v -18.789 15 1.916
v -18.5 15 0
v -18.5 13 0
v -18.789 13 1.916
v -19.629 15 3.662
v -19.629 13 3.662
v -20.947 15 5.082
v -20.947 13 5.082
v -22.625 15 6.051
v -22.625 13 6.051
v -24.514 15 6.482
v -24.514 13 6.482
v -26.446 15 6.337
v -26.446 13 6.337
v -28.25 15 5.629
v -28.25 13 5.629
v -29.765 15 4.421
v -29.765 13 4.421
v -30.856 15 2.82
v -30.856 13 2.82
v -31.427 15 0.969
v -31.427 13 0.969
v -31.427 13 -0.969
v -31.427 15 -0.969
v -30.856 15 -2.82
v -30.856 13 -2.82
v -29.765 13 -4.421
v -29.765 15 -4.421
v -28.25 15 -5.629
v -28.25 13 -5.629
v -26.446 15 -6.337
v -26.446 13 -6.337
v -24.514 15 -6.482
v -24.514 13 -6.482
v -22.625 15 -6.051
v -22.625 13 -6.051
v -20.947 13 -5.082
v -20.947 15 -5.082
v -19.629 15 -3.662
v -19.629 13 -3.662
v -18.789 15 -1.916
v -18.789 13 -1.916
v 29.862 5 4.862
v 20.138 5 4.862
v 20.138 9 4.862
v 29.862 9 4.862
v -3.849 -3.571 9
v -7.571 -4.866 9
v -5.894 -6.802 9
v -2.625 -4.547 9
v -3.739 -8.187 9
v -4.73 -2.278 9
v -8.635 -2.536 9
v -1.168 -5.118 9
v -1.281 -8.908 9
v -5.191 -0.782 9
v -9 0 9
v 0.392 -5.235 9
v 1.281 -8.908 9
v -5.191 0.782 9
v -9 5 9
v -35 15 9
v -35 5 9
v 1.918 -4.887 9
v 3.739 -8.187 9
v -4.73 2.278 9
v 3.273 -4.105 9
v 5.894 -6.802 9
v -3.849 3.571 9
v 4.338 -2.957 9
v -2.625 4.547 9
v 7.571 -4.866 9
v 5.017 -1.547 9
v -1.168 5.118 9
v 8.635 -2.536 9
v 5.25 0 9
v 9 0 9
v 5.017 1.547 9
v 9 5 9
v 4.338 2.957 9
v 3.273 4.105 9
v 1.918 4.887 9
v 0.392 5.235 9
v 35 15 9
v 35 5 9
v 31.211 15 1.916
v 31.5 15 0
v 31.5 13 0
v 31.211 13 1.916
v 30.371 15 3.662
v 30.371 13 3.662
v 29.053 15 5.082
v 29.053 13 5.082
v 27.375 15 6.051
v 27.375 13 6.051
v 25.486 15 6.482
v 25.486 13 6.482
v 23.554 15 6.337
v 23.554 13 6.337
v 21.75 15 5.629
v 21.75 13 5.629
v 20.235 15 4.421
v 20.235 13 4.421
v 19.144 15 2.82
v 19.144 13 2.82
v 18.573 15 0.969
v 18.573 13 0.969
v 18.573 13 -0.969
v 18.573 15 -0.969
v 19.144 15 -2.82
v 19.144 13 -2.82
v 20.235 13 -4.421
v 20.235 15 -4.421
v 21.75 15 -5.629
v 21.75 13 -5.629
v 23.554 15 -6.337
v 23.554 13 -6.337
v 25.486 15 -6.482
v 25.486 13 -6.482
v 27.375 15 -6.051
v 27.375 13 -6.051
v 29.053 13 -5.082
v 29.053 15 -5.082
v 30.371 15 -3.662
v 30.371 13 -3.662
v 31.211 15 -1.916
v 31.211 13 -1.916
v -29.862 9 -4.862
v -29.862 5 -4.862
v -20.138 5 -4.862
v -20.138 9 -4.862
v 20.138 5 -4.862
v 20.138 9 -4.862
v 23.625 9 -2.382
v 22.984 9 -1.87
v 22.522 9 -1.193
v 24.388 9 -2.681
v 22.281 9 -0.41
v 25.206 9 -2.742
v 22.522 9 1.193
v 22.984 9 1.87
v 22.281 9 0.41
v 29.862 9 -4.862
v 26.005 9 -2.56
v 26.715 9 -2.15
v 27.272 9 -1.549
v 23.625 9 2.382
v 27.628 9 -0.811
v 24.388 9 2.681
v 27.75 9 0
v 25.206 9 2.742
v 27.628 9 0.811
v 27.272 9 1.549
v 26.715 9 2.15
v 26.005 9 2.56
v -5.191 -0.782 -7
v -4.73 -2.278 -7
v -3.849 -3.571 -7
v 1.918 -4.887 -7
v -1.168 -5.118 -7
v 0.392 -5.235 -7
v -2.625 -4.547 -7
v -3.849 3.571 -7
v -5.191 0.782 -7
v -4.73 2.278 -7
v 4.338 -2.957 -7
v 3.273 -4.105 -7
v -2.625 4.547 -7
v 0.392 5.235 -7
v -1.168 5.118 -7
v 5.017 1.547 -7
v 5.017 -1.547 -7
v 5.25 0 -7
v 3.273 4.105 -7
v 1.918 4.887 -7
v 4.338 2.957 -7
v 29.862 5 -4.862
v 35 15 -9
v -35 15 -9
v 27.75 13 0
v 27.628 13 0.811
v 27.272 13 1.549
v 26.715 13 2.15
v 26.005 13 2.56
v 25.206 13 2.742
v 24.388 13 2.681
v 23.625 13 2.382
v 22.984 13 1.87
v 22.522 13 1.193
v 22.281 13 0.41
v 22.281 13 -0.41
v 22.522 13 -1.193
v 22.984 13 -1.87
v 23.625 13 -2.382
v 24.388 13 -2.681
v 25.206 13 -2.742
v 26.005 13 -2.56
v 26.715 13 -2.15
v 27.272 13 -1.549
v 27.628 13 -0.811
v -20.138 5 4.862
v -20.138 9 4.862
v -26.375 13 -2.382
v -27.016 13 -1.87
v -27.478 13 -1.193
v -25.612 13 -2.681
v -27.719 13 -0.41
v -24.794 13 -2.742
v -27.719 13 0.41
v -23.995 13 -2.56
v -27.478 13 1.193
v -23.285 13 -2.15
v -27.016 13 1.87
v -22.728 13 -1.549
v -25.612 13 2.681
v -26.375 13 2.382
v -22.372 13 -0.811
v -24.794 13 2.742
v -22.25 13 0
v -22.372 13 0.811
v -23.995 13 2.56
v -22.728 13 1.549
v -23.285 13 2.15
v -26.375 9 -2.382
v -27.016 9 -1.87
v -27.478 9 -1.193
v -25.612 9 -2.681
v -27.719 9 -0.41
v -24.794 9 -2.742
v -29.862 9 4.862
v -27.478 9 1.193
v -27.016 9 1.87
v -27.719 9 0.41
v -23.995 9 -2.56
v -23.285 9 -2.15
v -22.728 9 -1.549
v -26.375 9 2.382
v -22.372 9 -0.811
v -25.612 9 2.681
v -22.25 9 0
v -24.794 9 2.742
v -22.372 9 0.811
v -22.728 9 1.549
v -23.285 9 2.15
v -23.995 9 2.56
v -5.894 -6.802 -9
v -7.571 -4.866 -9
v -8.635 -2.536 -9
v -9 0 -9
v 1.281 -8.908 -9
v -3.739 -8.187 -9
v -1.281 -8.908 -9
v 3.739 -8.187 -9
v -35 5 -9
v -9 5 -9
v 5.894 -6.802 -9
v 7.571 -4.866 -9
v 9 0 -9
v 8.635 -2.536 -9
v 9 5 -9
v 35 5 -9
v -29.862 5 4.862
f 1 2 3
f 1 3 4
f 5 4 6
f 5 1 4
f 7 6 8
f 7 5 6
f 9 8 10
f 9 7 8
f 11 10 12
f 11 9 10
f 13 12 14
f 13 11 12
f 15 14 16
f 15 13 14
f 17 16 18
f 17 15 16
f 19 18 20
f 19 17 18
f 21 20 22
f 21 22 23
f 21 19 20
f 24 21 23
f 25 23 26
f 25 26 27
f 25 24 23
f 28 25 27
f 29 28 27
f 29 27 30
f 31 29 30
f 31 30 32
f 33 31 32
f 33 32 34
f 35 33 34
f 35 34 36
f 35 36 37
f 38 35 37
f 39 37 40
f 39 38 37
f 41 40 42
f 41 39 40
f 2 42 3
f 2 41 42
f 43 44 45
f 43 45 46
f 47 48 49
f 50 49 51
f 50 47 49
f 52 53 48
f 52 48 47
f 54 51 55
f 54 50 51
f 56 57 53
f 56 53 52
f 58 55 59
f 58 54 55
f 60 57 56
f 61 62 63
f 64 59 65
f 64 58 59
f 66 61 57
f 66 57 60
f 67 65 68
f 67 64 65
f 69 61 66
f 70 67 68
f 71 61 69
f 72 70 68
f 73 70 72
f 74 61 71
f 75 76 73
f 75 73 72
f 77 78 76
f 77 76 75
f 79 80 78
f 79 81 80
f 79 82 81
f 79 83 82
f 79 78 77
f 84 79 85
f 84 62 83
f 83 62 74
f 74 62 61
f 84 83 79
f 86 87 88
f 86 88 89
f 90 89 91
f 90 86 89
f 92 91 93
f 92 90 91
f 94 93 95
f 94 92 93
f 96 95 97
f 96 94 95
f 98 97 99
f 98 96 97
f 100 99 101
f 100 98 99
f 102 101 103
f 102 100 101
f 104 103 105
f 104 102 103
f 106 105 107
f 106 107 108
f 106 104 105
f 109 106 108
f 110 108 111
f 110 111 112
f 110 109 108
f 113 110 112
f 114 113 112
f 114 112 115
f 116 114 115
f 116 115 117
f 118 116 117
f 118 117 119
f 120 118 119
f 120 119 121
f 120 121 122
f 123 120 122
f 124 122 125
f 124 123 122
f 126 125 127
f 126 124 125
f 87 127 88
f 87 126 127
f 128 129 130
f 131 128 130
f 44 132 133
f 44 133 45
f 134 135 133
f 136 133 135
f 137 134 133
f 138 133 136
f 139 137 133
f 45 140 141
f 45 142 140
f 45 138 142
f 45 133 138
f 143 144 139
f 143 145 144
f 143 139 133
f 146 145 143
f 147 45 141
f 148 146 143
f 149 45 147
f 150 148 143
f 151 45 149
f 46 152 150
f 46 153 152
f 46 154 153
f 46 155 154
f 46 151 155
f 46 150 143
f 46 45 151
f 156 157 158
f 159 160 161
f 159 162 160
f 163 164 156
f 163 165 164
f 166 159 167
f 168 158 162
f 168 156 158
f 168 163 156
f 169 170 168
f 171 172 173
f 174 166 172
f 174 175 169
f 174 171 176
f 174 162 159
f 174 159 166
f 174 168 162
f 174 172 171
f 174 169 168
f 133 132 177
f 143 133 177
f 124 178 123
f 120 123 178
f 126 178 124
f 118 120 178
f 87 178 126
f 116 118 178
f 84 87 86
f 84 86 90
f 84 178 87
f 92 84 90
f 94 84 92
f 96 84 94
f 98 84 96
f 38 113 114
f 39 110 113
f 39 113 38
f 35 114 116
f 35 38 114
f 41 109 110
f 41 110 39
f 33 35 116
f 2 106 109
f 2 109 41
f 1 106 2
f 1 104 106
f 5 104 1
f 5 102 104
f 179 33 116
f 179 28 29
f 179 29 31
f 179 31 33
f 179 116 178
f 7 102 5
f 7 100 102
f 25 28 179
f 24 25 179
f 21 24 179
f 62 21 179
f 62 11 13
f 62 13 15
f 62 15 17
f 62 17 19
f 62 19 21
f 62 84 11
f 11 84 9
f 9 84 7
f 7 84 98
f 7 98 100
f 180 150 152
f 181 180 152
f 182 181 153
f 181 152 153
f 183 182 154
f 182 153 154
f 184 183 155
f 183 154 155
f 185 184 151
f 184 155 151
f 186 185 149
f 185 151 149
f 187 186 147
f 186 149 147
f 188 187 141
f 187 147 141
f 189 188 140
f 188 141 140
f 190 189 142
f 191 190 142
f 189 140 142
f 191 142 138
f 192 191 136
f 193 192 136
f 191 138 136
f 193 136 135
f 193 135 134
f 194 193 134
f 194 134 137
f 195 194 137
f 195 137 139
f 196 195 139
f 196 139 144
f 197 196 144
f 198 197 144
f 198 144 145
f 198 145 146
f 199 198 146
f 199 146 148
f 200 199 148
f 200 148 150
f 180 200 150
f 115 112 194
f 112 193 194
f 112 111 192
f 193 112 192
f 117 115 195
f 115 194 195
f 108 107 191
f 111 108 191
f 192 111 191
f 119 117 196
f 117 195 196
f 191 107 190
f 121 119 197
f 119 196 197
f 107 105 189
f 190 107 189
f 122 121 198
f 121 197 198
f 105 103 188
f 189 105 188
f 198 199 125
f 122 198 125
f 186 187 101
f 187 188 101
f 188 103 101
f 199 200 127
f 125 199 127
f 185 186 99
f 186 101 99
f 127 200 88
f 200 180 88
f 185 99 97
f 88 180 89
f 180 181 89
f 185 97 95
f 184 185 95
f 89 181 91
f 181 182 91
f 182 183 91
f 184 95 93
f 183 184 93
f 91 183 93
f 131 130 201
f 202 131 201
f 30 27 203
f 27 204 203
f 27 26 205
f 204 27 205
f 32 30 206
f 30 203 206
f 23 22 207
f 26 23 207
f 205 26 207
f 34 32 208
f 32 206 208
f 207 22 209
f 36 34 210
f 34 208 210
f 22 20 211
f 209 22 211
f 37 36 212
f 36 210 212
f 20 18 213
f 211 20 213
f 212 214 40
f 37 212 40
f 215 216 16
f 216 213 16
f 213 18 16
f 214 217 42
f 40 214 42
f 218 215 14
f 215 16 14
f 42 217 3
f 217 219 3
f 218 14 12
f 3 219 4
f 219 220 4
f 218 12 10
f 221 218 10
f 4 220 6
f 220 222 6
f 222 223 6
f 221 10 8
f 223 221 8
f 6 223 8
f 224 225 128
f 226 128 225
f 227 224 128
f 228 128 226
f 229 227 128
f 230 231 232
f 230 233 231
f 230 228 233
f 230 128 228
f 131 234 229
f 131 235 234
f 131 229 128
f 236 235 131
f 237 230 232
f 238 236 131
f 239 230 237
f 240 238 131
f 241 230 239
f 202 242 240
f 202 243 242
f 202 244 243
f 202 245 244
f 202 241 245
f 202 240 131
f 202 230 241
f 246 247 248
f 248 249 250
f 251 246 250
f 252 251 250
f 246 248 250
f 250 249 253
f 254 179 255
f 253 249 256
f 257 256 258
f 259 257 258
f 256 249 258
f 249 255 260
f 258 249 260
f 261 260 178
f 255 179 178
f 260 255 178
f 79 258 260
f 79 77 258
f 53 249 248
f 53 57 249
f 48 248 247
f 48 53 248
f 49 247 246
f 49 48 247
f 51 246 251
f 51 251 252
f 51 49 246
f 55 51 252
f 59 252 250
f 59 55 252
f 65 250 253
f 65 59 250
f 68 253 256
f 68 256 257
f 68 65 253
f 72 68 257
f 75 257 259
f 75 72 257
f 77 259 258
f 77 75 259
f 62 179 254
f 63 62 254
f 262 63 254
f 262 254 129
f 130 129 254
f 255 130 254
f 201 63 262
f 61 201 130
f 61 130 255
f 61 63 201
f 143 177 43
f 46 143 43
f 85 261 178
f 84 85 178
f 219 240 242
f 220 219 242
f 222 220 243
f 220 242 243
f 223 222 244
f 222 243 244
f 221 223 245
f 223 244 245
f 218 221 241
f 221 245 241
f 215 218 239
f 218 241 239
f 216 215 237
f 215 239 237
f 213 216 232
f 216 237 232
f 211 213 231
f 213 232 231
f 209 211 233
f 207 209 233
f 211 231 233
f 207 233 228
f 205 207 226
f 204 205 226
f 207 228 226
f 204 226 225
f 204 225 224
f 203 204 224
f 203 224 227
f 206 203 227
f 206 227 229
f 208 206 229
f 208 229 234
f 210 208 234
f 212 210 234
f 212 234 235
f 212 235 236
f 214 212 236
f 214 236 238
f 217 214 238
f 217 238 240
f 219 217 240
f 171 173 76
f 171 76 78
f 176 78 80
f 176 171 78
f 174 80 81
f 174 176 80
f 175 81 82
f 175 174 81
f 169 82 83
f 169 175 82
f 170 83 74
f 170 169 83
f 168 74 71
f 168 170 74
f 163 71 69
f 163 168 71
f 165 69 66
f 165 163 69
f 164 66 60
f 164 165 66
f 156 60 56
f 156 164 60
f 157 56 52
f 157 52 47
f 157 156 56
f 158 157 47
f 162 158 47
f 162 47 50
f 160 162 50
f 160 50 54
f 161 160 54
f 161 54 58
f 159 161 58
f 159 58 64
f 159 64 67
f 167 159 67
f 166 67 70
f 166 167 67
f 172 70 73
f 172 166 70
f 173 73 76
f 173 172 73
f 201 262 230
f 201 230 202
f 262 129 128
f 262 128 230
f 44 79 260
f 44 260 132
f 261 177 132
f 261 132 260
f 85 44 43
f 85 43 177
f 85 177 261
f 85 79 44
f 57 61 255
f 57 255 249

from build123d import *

# Parameters (mm, degrees)
SKETCH064_R     = 5.25
PAD044_DEPTH    = 9
SKETCH065_R     = 2.75
POCKET016_DEPTH = 15.001
SKETCH066_R     = 6.5
POCKET017_DEPTH = 2
SKETCH067_R     = 9
PAD045_DEPTH    = 2
SKETCH068_W     = 9.725
SKETCH068_H     = 9.725
POCKET018_DEPTH = 4


with BuildPart() as part:
    # Sketch064 → Pad044 (new body, symmetric)
    with BuildSketch(Plane.XY):
        with BuildLine():
            Line((35, 15), (-35, 15))
            Line((-35, 15), (-35, 5))
            Line((-35, 5), (-9, 5))
            Line((-9, 5), (-9, 0))
            ThreePointArc((-9, 0), (0, -9), (9, 0))
            Line((9, 0), (9, 5))
            Line((9, 5), (35, 5))
            Line((35, 5), (35, 15))
        make_face()
        Circle(SKETCH064_R, mode=Mode.SUBTRACT)
    extrude(amount=PAD044_DEPTH, both=True)

    # Sketch065 → Pocket016 (cut, through all)
    with BuildSketch(Plane.XZ):
        with Locations((-25, 0)):
            Circle(SKETCH065_R)
        with Locations((25, 0)):
            Circle(SKETCH065_R)
    extrude(amount=-POCKET016_DEPTH, mode=Mode.SUBTRACT)

    # Sketch066 → Pocket017 (cut)
    with BuildSketch(Plane.XZ.offset(-15)):
        with Locations((-25, 0)):
            Circle(SKETCH066_R)
        with Locations((25, 0)):
            Circle(SKETCH066_R)
    extrude(amount=POCKET017_DEPTH, mode=Mode.SUBTRACT)

    # Sketch067 → Pad045 (join)
    with BuildSketch(Plane.XY.offset(-9)):
        Circle(SKETCH067_R)
    extrude(amount=PAD045_DEPTH)

    # Sketch068 → Pocket018 (cut)
    with BuildSketch(Plane.XZ.offset(-5)):
        with Locations((-25, 0)):
            Rectangle(SKETCH068_W, SKETCH068_H)
        with Locations((25, 0)):
            Rectangle(SKETCH068_W, SKETCH068_H)
    extrude(amount=-POCKET018_DEPTH, mode=Mode.SUBTRACT)


solid = part.part
